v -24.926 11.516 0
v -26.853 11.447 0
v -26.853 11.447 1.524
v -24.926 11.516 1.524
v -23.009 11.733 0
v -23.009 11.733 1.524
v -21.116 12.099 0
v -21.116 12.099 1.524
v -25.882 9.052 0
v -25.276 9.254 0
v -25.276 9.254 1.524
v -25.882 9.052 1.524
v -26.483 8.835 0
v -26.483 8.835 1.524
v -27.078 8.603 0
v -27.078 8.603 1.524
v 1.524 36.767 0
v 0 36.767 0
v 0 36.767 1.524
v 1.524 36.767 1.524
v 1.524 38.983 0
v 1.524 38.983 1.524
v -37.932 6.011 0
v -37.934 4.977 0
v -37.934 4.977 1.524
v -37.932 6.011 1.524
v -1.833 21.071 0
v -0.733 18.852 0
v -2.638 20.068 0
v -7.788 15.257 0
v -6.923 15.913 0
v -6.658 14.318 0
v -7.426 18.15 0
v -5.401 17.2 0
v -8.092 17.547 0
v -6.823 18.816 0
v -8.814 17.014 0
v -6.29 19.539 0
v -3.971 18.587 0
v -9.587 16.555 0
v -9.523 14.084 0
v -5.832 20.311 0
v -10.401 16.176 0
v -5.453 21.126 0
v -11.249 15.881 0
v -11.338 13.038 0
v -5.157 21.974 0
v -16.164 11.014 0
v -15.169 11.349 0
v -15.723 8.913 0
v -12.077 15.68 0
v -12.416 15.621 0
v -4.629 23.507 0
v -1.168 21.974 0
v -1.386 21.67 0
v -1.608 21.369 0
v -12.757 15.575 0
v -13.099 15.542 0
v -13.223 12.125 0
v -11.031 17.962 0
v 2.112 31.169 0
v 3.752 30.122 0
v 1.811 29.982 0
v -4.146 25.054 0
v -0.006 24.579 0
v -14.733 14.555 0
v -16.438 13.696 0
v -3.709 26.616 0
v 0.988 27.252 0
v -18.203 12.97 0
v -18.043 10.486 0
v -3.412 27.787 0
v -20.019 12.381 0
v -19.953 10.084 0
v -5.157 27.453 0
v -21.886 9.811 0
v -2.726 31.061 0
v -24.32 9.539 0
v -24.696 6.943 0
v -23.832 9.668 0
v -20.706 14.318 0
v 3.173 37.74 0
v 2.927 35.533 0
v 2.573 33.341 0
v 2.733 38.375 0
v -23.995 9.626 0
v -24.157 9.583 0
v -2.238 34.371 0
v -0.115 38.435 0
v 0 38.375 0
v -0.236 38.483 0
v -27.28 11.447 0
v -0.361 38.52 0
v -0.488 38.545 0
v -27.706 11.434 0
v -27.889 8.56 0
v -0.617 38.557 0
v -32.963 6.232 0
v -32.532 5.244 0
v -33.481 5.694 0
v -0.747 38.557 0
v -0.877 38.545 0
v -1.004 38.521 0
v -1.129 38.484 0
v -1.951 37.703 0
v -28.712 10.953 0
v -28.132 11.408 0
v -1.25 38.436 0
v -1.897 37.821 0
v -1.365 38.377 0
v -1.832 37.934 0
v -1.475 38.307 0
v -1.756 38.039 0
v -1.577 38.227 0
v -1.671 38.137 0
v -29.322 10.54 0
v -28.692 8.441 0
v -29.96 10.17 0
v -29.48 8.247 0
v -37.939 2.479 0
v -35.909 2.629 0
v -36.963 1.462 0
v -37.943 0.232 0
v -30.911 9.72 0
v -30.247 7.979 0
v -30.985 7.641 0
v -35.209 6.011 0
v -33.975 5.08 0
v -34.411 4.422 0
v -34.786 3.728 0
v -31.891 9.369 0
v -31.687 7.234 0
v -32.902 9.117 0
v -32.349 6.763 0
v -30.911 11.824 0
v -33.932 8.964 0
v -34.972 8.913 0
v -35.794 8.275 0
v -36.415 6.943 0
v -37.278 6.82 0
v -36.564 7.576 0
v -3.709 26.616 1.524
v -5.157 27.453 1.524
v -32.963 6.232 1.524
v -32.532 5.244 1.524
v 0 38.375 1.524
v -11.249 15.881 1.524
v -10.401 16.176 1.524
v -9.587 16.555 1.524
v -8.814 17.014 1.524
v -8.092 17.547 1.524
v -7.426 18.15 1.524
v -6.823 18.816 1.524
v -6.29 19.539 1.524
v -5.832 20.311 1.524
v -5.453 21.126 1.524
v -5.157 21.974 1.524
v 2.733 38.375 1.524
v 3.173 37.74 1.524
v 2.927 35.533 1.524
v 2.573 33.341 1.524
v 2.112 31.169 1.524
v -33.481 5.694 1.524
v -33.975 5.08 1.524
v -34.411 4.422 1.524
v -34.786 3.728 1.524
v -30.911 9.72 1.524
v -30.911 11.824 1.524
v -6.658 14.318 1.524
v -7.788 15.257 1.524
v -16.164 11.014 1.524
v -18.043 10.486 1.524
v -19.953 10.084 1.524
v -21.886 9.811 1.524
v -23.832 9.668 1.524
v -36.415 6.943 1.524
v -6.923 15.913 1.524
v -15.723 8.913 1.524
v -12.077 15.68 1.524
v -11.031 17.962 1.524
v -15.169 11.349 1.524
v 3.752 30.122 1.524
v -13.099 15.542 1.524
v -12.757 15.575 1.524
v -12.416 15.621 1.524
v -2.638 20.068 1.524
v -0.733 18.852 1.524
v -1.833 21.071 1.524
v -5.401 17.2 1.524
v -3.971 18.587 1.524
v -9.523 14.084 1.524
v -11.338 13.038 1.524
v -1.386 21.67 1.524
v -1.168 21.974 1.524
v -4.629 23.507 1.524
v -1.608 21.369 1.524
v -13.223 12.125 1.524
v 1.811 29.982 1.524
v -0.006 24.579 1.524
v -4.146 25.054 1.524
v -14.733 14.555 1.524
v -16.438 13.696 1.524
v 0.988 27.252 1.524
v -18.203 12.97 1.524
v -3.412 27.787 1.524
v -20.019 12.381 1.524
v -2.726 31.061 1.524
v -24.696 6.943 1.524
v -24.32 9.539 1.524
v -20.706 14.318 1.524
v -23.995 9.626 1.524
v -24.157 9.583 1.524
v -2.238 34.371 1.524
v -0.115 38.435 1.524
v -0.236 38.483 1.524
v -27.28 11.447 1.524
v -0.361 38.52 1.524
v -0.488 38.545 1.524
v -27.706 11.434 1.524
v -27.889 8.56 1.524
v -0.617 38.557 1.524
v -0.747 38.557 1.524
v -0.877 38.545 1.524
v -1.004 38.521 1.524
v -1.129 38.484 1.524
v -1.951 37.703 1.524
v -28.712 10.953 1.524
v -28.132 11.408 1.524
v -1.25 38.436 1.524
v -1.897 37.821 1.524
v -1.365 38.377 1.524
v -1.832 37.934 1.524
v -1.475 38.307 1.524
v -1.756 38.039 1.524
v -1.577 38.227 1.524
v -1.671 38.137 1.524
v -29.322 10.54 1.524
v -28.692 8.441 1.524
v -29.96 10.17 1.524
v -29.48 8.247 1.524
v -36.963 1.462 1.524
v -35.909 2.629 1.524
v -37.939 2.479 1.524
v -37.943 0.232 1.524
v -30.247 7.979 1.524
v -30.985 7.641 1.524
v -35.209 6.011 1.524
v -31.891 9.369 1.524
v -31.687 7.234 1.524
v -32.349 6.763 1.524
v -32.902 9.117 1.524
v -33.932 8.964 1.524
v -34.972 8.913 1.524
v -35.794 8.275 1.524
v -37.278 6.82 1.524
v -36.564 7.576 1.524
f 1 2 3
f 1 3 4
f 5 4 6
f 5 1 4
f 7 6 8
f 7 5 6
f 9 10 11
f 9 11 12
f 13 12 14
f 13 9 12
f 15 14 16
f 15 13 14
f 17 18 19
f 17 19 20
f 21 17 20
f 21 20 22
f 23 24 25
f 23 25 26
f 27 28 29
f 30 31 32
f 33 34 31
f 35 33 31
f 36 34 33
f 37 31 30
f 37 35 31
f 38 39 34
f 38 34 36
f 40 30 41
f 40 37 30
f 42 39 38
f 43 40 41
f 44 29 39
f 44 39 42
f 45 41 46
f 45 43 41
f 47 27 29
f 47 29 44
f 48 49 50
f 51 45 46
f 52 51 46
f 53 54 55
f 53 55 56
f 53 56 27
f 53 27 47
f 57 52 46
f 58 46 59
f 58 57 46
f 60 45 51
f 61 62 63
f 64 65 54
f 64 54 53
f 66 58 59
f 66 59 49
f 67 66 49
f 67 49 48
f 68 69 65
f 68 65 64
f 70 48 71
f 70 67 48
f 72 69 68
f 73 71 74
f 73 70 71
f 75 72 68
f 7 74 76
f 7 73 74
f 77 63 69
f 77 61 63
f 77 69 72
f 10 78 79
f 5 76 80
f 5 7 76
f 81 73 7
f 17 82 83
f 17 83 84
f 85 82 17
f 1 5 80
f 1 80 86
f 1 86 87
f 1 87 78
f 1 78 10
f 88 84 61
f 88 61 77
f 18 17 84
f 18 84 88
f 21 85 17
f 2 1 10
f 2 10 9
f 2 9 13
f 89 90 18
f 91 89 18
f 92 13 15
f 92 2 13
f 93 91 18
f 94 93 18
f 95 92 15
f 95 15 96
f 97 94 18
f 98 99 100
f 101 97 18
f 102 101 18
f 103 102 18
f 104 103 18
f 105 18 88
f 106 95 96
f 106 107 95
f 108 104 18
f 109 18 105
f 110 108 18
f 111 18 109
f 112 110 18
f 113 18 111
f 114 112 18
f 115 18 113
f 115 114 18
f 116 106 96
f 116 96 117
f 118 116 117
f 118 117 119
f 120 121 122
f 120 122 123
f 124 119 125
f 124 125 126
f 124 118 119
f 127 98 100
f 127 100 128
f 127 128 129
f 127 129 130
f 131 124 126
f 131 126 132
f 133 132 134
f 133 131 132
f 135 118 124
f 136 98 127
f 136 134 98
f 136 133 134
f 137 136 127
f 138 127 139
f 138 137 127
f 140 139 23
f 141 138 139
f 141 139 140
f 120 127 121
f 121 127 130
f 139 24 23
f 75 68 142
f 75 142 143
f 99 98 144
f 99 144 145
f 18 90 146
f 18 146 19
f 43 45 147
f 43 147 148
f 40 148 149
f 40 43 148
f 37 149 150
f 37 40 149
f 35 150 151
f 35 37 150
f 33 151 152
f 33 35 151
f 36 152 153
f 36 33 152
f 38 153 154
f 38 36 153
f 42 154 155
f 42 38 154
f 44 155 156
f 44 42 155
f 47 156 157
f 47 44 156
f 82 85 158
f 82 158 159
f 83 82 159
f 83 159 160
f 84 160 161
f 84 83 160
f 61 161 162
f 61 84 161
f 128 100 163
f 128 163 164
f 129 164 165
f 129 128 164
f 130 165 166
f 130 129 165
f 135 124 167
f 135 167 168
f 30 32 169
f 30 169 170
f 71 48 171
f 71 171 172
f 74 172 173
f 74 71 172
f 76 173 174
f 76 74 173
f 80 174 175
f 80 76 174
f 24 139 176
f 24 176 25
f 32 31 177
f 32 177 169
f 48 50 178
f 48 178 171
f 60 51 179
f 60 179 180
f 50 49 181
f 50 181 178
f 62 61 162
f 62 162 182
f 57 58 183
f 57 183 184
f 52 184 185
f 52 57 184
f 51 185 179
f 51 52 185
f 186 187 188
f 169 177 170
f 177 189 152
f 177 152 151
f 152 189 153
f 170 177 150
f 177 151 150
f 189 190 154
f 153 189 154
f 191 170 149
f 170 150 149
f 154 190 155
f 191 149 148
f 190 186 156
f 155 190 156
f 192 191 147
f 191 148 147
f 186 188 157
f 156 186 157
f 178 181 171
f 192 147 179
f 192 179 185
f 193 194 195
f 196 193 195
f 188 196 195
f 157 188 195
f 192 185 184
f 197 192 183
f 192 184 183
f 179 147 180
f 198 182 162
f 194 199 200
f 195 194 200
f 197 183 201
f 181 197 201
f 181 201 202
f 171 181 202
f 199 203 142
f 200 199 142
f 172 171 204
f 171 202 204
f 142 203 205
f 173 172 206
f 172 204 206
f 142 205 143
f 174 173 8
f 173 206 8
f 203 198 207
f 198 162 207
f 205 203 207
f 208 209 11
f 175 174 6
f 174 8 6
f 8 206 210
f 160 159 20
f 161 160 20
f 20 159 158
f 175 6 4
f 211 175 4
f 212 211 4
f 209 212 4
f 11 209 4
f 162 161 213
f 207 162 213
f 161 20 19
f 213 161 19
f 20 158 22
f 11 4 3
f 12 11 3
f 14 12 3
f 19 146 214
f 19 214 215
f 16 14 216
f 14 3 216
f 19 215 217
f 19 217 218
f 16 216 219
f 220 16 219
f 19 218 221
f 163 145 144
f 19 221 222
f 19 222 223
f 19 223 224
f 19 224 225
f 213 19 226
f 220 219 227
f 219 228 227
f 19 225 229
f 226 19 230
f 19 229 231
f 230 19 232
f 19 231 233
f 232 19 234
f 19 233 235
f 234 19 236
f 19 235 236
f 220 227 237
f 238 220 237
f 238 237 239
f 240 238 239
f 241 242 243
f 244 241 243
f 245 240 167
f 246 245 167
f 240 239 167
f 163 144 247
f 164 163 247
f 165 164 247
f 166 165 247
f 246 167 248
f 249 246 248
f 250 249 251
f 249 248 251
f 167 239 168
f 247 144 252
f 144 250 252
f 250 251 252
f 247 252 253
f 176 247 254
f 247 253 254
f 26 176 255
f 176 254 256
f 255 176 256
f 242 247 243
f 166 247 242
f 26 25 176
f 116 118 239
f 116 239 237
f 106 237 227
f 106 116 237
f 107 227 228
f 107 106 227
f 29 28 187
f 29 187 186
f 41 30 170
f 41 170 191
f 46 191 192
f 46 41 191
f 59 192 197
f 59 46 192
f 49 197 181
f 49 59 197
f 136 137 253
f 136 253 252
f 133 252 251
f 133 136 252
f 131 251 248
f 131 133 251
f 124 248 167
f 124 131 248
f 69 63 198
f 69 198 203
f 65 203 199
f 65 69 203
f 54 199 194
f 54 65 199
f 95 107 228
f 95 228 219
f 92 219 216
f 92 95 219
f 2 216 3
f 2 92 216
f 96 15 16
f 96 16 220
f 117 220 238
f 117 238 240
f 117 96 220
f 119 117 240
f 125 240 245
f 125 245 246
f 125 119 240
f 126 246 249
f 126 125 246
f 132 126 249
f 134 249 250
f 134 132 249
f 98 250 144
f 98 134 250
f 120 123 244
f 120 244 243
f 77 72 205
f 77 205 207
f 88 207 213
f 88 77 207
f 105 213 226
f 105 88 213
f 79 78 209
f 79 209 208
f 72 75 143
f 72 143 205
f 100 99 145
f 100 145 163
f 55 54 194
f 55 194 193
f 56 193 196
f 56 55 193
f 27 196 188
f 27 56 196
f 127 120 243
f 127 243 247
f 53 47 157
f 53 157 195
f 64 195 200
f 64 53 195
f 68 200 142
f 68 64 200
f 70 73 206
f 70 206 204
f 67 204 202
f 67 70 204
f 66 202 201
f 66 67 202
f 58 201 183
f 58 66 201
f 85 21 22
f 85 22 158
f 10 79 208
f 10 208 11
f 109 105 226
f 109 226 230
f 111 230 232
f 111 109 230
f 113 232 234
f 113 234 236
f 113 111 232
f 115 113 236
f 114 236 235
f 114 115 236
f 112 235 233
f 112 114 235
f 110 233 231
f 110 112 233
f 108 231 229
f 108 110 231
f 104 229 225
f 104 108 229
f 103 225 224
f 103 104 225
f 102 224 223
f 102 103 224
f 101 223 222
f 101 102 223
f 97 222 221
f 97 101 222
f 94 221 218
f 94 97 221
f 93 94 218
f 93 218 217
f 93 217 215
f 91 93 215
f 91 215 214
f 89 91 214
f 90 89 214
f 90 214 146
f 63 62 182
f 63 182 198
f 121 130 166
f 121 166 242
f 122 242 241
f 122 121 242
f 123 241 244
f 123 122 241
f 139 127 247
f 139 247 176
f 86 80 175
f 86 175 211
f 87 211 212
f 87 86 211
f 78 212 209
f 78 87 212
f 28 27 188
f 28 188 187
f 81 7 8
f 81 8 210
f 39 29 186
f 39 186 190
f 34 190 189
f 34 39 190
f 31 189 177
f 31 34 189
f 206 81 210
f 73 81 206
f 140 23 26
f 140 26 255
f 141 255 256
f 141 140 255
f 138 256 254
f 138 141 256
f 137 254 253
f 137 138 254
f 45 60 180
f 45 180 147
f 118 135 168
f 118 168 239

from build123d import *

# Parameters (mm, degrees)
BOSS_EXTRUDE1_DEPTH = 1.524


with BuildPart() as part:
    # Sketch1 → Boss-Extrude1 (new body)
    with BuildSketch(Plane.XY):
        with BuildLine():
            Line((0, 36.766680051), (1.524, 36.766680051))
            Line((1.524, 36.766680051), (1.524, 38.982585825))
            Line((1.524, 38.982585825), (2.733148625, 38.375210755))
            Line((2.733148625, 38.375210755), (3.173163666, 37.740395602))
            ThreePointArc((3.173163666, 37.740395602), (2.76380149, 34.435260273), (2.111575724, 31.169360935))
            Line((2.111575724, 31.169360935), (3.752142818, 30.122391454))
            Line((3.752142818, 30.122391454), (1.811466825, 29.982342047))
            ThreePointArc((1.811466825, 29.982342047), (0.512131502, 25.907377193), (-1.167502988, 21.973875087))
            ThreePointArc((-1.167502988, 21.973875087), (-1.496079249, 21.518994961), (-1.833336721, 21.070513426))
            Line((-1.833336721, 21.070513426), (-0.732526116, 18.85197433))
            Line((-0.732526116, 18.85197433), (-2.63805659, 20.068036908))
            ThreePointArc((-2.63805659, 20.068036908), (-4.673990558, 17.880915718), (-6.922800397, 15.913333311))
            Line((-6.922800397, 15.913333311), (-6.657550745, 14.318385487))
            Line((-6.657550745, 14.318385487), (-7.787922662, 15.257015862))
            ThreePointArc((-7.787922662, 15.257015862), (-11.338183777, 13.037842353), (-15.16934542, 11.349267359))
            Line((-15.16934542, 11.349267359), (-15.723402455, 8.912532591))
            Line((-15.723402455, 8.912532591), (-16.164329399, 11.013577704))
            ThreePointArc((-16.164329399, 11.013577704), (-19.953116728, 10.084187136), (-23.831985363, 9.668189099))
            ThreePointArc((-23.831985363, 9.668189099), (-24.076075542, 9.604568952), (-24.319524306, 9.538536852))
            Line((-24.319524306, 9.538536852), (-24.695691572, 6.942894819))
            Line((-24.695691572, 6.942894819), (-25.27612991, 9.253711636))
            ThreePointArc((-25.27612991, 9.253711636), (-26.183331796, 8.945243362), (-27.078300937, 8.602901171))
            ThreePointArc((-27.078300937, 8.602901171), (-30.246868295, 7.97926726), (-32.962548086, 6.231748554))
            Line((-32.962548086, 6.231748554), (-32.532162923, 5.243855929))
            Line((-32.532162923, 5.243855929), (-33.480739201, 5.694007752))
            ThreePointArc((-33.480739201, 5.694007752), (-34.200835329, 4.756022574), (-34.785563978, 3.728186482))
            ThreePointArc((-34.785563978, 3.728186482), (-36.445037111, 2.053220727), (-37.942668533, 0.232105276))
            Line((-37.942668533, 0.232105276), (-37.938700484, 2.479305956))
            Line((-37.938700484, 2.479305956), (-35.209054914, 6.010902474))
            Line((-35.209054914, 6.010902474), (-36.41486015, 6.942894819))
            Line((-36.41486015, 6.942894819), (-37.934290003, 4.977067008))
            Line((-37.934290003, 4.977067008), (-37.932464483, 6.010902474))
            ThreePointArc((-37.932464483, 6.010902474), (-36.563778761, 7.575593862), (-34.971875943, 8.912532591))
            ThreePointArc((-34.971875943, 8.912532591), (-32.901550016, 9.116540541), (-30.910632492, 9.719960876))
            Line((-30.910632492, 9.719960876), (-30.910632492, 11.8237405))
            Line((-30.910632492, 11.8237405), (-29.95978759, 10.169722089))
            ThreePointArc((-29.95978759, 10.169722089), (-29.013670421, 10.741179379), (-28.13202331, 11.407812338))
            ThreePointArc((-28.13202331, 11.407812338), (-27.492889702, 11.44249827), (-26.85283117, 11.446965831))
            ThreePointArc((-26.85283117, 11.446965831), (-23.965434713, 11.605929088), (-21.115990345, 12.098873725))
            Line((-21.115990345, 12.098873725), (-20.706404595, 14.318385487))
            Line((-20.706404595, 14.318385487), (-20.019464899, 12.381448288))
            ThreePointArc((-20.019464899, 12.381448288), (-16.437841998, 13.695848714), (-13.099310966, 15.542435195))
            ThreePointArc((-13.099310966, 15.542435195), (-12.585951474, 15.59640554), (-12.076536587, 15.679755638))
            Line((-12.076536587, 15.679755638), (-11.031123121, 17.962204557))
            Line((-11.031123121, 17.962204557), (-11.249347571, 15.880665501))
            ThreePointArc((-11.249347571, 15.880665501), (-7.425610197, 18.149727188), (-5.157240456, 21.973875087))
            ThreePointArc((-5.157240456, 21.973875087), (-4.381951062, 24.278807565), (-3.708542129, 26.615537712))
            Line((-3.708542129, 26.615537712), (-5.157240456, 27.453082135))
            Line((-5.157240456, 27.453082135), (-3.412165634, 27.787336527))
            ThreePointArc((-3.412165634, 27.787336527), (-2.457151359, 32.712229886), (-1.951475295, 37.703313794))
            ThreePointArc((-1.951475295, 37.703313794), (-1.128983902, 38.484354747), (0, 38.375210755))
            Line((0, 38.375210755), (0, 36.766680051))
        make_face()
    extrude(amount=BOSS_EXTRUDE1_DEPTH)


solid = part.part
